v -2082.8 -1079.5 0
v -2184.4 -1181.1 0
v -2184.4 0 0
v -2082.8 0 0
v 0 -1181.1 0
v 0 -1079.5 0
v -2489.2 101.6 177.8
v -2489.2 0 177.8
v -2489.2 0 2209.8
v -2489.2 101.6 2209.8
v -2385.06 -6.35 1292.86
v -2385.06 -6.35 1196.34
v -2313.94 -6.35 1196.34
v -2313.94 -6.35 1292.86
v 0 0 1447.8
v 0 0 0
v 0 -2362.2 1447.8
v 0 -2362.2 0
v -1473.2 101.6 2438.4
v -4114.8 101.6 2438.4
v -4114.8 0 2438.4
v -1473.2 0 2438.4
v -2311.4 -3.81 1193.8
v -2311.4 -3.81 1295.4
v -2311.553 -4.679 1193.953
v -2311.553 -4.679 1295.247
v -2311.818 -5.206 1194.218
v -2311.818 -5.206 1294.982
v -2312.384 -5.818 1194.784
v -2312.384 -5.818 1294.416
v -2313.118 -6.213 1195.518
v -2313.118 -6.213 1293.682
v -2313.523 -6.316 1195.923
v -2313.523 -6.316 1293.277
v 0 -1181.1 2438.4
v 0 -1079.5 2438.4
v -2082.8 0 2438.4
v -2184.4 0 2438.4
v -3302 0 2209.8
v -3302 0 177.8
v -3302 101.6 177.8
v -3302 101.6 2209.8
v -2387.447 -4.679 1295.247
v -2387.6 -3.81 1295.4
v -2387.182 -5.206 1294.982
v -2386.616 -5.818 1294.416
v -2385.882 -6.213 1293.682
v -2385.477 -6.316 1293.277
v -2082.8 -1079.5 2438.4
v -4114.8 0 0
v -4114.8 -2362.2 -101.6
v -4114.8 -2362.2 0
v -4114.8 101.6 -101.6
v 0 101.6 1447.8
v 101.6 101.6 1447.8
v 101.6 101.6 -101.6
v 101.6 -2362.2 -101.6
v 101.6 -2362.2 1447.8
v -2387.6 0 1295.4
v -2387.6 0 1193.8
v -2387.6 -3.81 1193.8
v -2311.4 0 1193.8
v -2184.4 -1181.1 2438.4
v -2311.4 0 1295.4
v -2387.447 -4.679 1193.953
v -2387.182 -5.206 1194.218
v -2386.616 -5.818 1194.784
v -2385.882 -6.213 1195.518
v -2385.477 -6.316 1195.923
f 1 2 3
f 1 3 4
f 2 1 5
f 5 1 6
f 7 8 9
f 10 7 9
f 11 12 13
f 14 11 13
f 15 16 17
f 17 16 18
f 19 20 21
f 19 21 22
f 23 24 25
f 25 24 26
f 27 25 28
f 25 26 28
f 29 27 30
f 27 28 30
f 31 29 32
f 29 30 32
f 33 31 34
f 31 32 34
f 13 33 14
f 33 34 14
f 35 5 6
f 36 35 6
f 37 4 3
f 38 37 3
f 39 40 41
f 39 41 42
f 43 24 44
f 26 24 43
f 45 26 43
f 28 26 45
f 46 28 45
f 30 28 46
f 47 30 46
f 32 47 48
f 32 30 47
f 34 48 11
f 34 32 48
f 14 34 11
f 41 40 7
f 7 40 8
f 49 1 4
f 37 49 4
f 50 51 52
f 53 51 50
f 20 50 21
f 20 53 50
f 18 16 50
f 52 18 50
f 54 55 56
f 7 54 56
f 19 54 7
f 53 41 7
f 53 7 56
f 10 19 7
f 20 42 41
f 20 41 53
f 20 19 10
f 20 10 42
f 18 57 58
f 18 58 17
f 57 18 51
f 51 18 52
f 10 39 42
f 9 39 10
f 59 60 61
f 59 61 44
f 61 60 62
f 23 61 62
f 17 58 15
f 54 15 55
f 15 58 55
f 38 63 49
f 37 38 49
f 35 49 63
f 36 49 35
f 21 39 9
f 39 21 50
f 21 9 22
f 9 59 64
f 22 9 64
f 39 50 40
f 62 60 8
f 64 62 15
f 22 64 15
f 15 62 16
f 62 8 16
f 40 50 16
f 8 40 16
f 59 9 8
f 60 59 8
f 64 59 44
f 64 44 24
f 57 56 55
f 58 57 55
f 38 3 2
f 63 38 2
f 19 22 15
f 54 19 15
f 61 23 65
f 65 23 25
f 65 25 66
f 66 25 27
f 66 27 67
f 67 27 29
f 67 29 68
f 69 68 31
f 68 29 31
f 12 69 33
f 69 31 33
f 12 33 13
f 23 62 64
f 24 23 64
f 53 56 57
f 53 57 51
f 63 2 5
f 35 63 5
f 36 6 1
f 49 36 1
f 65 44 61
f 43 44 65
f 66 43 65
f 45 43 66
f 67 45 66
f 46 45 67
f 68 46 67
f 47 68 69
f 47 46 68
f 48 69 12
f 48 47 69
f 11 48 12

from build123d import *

# Parameters (mm, degrees)
F1_DEPTH  = 2438.4
F2_W      = 812.8
F2_H      = 2032
F3_DEPTH  = 101.601
F4_W      = 2463.8
F4_H      = 990.6
F5_DEPTH  = 101.6
F6_W      = 4216.4
F6_H      = 101.6
F7_DEPTH  = 2463.8
F8_W      = 76.2
F8_H      = 101.6
F9_DEPTH  = 6.35
F10_R     = 2.54
F12_DEPTH = 914.4
F15_DEPTH = 2438.4


with BuildPart() as f1:
    # F0 (on Top) → F1 (new body)
    with BuildSketch(Plane.XY):
        Polygon((-4114.8, 0), (0, 0), (0, -2362.2), (101.6, -2362.2), (101.6, 101.6), (-4114.8, 101.6), align=None)
    extrude(amount=F1_DEPTH)

    # F2 (on face) → F3 (cut, through all)
    with BuildSketch(Plane.XZ):
        with Locations((-2895.6, 1193.8)):
            Rectangle(F2_W, F2_H)
        Polygon((-1473.2, 2438.4), (0, 1447.8), (0, 2438.4), align=None)
    extrude(amount=-F3_DEPTH, mode=Mode.SUBTRACT)

    # F4 (on face) → F5 (cut)
    with BuildSketch(Plane.YZ.offset(101.6)):
        with Locations((-1130.3, 1943.1)):
            Rectangle(F4_W, F4_H)
    extrude(amount=-F5_DEPTH, mode=Mode.SUBTRACT)

    # F6 (on face) → F7 (join)
    with BuildSketch(Plane(origin=(0, 101.6, 0), x_dir=(-1, 0, 0), z_dir=(0, 1, 0))):
        with Locations((2006.6, -50.8)):
            Rectangle(F6_W, F6_H)
    extrude(amount=-F7_DEPTH)

    # F8 (on face) → F9 (join)
    with BuildSketch(Plane.XZ):
        with Locations((-2349.5, 1244.6)):
            Rectangle(F8_W, F8_H)
    extrude(amount=F9_DEPTH)

    # F10
    f10_edges = [f1.edges().sort_by_distance(p)[0] for p in [
        (-2349.5, -6.35, 1295.4),
        (-2387.6, -6.35, 1244.6),
        (-2349.5, -6.35, 1193.8),
        (-2311.4, -6.35, 1244.6),
    ]]
    fillet(f10_edges, radius=F10_R)


with BuildPart() as f12:
    # F11 (on face) → F12 (new body)
    with BuildSketch(Plane.XZ):
        Polygon((-2209.8, 0), (0, 0), (0, 1447.8), (-1473.2, 2438.4), (-2209.8, 2438.4), align=None)
    extrude(amount=F12_DEPTH)


with BuildPart() as f15:
    # F14 (on face) → F15 (new body)
    with BuildSketch(Plane.XY):
        Polygon((-2184.4, -1181.1), (0, -1181.1), (0, -1079.5), (-2082.8, -1079.5), (-2082.8, 0), (-2184.4, 0), align=None)
    extrude(amount=F15_DEPTH)


solid = Compound([f1.part, f15.part])
